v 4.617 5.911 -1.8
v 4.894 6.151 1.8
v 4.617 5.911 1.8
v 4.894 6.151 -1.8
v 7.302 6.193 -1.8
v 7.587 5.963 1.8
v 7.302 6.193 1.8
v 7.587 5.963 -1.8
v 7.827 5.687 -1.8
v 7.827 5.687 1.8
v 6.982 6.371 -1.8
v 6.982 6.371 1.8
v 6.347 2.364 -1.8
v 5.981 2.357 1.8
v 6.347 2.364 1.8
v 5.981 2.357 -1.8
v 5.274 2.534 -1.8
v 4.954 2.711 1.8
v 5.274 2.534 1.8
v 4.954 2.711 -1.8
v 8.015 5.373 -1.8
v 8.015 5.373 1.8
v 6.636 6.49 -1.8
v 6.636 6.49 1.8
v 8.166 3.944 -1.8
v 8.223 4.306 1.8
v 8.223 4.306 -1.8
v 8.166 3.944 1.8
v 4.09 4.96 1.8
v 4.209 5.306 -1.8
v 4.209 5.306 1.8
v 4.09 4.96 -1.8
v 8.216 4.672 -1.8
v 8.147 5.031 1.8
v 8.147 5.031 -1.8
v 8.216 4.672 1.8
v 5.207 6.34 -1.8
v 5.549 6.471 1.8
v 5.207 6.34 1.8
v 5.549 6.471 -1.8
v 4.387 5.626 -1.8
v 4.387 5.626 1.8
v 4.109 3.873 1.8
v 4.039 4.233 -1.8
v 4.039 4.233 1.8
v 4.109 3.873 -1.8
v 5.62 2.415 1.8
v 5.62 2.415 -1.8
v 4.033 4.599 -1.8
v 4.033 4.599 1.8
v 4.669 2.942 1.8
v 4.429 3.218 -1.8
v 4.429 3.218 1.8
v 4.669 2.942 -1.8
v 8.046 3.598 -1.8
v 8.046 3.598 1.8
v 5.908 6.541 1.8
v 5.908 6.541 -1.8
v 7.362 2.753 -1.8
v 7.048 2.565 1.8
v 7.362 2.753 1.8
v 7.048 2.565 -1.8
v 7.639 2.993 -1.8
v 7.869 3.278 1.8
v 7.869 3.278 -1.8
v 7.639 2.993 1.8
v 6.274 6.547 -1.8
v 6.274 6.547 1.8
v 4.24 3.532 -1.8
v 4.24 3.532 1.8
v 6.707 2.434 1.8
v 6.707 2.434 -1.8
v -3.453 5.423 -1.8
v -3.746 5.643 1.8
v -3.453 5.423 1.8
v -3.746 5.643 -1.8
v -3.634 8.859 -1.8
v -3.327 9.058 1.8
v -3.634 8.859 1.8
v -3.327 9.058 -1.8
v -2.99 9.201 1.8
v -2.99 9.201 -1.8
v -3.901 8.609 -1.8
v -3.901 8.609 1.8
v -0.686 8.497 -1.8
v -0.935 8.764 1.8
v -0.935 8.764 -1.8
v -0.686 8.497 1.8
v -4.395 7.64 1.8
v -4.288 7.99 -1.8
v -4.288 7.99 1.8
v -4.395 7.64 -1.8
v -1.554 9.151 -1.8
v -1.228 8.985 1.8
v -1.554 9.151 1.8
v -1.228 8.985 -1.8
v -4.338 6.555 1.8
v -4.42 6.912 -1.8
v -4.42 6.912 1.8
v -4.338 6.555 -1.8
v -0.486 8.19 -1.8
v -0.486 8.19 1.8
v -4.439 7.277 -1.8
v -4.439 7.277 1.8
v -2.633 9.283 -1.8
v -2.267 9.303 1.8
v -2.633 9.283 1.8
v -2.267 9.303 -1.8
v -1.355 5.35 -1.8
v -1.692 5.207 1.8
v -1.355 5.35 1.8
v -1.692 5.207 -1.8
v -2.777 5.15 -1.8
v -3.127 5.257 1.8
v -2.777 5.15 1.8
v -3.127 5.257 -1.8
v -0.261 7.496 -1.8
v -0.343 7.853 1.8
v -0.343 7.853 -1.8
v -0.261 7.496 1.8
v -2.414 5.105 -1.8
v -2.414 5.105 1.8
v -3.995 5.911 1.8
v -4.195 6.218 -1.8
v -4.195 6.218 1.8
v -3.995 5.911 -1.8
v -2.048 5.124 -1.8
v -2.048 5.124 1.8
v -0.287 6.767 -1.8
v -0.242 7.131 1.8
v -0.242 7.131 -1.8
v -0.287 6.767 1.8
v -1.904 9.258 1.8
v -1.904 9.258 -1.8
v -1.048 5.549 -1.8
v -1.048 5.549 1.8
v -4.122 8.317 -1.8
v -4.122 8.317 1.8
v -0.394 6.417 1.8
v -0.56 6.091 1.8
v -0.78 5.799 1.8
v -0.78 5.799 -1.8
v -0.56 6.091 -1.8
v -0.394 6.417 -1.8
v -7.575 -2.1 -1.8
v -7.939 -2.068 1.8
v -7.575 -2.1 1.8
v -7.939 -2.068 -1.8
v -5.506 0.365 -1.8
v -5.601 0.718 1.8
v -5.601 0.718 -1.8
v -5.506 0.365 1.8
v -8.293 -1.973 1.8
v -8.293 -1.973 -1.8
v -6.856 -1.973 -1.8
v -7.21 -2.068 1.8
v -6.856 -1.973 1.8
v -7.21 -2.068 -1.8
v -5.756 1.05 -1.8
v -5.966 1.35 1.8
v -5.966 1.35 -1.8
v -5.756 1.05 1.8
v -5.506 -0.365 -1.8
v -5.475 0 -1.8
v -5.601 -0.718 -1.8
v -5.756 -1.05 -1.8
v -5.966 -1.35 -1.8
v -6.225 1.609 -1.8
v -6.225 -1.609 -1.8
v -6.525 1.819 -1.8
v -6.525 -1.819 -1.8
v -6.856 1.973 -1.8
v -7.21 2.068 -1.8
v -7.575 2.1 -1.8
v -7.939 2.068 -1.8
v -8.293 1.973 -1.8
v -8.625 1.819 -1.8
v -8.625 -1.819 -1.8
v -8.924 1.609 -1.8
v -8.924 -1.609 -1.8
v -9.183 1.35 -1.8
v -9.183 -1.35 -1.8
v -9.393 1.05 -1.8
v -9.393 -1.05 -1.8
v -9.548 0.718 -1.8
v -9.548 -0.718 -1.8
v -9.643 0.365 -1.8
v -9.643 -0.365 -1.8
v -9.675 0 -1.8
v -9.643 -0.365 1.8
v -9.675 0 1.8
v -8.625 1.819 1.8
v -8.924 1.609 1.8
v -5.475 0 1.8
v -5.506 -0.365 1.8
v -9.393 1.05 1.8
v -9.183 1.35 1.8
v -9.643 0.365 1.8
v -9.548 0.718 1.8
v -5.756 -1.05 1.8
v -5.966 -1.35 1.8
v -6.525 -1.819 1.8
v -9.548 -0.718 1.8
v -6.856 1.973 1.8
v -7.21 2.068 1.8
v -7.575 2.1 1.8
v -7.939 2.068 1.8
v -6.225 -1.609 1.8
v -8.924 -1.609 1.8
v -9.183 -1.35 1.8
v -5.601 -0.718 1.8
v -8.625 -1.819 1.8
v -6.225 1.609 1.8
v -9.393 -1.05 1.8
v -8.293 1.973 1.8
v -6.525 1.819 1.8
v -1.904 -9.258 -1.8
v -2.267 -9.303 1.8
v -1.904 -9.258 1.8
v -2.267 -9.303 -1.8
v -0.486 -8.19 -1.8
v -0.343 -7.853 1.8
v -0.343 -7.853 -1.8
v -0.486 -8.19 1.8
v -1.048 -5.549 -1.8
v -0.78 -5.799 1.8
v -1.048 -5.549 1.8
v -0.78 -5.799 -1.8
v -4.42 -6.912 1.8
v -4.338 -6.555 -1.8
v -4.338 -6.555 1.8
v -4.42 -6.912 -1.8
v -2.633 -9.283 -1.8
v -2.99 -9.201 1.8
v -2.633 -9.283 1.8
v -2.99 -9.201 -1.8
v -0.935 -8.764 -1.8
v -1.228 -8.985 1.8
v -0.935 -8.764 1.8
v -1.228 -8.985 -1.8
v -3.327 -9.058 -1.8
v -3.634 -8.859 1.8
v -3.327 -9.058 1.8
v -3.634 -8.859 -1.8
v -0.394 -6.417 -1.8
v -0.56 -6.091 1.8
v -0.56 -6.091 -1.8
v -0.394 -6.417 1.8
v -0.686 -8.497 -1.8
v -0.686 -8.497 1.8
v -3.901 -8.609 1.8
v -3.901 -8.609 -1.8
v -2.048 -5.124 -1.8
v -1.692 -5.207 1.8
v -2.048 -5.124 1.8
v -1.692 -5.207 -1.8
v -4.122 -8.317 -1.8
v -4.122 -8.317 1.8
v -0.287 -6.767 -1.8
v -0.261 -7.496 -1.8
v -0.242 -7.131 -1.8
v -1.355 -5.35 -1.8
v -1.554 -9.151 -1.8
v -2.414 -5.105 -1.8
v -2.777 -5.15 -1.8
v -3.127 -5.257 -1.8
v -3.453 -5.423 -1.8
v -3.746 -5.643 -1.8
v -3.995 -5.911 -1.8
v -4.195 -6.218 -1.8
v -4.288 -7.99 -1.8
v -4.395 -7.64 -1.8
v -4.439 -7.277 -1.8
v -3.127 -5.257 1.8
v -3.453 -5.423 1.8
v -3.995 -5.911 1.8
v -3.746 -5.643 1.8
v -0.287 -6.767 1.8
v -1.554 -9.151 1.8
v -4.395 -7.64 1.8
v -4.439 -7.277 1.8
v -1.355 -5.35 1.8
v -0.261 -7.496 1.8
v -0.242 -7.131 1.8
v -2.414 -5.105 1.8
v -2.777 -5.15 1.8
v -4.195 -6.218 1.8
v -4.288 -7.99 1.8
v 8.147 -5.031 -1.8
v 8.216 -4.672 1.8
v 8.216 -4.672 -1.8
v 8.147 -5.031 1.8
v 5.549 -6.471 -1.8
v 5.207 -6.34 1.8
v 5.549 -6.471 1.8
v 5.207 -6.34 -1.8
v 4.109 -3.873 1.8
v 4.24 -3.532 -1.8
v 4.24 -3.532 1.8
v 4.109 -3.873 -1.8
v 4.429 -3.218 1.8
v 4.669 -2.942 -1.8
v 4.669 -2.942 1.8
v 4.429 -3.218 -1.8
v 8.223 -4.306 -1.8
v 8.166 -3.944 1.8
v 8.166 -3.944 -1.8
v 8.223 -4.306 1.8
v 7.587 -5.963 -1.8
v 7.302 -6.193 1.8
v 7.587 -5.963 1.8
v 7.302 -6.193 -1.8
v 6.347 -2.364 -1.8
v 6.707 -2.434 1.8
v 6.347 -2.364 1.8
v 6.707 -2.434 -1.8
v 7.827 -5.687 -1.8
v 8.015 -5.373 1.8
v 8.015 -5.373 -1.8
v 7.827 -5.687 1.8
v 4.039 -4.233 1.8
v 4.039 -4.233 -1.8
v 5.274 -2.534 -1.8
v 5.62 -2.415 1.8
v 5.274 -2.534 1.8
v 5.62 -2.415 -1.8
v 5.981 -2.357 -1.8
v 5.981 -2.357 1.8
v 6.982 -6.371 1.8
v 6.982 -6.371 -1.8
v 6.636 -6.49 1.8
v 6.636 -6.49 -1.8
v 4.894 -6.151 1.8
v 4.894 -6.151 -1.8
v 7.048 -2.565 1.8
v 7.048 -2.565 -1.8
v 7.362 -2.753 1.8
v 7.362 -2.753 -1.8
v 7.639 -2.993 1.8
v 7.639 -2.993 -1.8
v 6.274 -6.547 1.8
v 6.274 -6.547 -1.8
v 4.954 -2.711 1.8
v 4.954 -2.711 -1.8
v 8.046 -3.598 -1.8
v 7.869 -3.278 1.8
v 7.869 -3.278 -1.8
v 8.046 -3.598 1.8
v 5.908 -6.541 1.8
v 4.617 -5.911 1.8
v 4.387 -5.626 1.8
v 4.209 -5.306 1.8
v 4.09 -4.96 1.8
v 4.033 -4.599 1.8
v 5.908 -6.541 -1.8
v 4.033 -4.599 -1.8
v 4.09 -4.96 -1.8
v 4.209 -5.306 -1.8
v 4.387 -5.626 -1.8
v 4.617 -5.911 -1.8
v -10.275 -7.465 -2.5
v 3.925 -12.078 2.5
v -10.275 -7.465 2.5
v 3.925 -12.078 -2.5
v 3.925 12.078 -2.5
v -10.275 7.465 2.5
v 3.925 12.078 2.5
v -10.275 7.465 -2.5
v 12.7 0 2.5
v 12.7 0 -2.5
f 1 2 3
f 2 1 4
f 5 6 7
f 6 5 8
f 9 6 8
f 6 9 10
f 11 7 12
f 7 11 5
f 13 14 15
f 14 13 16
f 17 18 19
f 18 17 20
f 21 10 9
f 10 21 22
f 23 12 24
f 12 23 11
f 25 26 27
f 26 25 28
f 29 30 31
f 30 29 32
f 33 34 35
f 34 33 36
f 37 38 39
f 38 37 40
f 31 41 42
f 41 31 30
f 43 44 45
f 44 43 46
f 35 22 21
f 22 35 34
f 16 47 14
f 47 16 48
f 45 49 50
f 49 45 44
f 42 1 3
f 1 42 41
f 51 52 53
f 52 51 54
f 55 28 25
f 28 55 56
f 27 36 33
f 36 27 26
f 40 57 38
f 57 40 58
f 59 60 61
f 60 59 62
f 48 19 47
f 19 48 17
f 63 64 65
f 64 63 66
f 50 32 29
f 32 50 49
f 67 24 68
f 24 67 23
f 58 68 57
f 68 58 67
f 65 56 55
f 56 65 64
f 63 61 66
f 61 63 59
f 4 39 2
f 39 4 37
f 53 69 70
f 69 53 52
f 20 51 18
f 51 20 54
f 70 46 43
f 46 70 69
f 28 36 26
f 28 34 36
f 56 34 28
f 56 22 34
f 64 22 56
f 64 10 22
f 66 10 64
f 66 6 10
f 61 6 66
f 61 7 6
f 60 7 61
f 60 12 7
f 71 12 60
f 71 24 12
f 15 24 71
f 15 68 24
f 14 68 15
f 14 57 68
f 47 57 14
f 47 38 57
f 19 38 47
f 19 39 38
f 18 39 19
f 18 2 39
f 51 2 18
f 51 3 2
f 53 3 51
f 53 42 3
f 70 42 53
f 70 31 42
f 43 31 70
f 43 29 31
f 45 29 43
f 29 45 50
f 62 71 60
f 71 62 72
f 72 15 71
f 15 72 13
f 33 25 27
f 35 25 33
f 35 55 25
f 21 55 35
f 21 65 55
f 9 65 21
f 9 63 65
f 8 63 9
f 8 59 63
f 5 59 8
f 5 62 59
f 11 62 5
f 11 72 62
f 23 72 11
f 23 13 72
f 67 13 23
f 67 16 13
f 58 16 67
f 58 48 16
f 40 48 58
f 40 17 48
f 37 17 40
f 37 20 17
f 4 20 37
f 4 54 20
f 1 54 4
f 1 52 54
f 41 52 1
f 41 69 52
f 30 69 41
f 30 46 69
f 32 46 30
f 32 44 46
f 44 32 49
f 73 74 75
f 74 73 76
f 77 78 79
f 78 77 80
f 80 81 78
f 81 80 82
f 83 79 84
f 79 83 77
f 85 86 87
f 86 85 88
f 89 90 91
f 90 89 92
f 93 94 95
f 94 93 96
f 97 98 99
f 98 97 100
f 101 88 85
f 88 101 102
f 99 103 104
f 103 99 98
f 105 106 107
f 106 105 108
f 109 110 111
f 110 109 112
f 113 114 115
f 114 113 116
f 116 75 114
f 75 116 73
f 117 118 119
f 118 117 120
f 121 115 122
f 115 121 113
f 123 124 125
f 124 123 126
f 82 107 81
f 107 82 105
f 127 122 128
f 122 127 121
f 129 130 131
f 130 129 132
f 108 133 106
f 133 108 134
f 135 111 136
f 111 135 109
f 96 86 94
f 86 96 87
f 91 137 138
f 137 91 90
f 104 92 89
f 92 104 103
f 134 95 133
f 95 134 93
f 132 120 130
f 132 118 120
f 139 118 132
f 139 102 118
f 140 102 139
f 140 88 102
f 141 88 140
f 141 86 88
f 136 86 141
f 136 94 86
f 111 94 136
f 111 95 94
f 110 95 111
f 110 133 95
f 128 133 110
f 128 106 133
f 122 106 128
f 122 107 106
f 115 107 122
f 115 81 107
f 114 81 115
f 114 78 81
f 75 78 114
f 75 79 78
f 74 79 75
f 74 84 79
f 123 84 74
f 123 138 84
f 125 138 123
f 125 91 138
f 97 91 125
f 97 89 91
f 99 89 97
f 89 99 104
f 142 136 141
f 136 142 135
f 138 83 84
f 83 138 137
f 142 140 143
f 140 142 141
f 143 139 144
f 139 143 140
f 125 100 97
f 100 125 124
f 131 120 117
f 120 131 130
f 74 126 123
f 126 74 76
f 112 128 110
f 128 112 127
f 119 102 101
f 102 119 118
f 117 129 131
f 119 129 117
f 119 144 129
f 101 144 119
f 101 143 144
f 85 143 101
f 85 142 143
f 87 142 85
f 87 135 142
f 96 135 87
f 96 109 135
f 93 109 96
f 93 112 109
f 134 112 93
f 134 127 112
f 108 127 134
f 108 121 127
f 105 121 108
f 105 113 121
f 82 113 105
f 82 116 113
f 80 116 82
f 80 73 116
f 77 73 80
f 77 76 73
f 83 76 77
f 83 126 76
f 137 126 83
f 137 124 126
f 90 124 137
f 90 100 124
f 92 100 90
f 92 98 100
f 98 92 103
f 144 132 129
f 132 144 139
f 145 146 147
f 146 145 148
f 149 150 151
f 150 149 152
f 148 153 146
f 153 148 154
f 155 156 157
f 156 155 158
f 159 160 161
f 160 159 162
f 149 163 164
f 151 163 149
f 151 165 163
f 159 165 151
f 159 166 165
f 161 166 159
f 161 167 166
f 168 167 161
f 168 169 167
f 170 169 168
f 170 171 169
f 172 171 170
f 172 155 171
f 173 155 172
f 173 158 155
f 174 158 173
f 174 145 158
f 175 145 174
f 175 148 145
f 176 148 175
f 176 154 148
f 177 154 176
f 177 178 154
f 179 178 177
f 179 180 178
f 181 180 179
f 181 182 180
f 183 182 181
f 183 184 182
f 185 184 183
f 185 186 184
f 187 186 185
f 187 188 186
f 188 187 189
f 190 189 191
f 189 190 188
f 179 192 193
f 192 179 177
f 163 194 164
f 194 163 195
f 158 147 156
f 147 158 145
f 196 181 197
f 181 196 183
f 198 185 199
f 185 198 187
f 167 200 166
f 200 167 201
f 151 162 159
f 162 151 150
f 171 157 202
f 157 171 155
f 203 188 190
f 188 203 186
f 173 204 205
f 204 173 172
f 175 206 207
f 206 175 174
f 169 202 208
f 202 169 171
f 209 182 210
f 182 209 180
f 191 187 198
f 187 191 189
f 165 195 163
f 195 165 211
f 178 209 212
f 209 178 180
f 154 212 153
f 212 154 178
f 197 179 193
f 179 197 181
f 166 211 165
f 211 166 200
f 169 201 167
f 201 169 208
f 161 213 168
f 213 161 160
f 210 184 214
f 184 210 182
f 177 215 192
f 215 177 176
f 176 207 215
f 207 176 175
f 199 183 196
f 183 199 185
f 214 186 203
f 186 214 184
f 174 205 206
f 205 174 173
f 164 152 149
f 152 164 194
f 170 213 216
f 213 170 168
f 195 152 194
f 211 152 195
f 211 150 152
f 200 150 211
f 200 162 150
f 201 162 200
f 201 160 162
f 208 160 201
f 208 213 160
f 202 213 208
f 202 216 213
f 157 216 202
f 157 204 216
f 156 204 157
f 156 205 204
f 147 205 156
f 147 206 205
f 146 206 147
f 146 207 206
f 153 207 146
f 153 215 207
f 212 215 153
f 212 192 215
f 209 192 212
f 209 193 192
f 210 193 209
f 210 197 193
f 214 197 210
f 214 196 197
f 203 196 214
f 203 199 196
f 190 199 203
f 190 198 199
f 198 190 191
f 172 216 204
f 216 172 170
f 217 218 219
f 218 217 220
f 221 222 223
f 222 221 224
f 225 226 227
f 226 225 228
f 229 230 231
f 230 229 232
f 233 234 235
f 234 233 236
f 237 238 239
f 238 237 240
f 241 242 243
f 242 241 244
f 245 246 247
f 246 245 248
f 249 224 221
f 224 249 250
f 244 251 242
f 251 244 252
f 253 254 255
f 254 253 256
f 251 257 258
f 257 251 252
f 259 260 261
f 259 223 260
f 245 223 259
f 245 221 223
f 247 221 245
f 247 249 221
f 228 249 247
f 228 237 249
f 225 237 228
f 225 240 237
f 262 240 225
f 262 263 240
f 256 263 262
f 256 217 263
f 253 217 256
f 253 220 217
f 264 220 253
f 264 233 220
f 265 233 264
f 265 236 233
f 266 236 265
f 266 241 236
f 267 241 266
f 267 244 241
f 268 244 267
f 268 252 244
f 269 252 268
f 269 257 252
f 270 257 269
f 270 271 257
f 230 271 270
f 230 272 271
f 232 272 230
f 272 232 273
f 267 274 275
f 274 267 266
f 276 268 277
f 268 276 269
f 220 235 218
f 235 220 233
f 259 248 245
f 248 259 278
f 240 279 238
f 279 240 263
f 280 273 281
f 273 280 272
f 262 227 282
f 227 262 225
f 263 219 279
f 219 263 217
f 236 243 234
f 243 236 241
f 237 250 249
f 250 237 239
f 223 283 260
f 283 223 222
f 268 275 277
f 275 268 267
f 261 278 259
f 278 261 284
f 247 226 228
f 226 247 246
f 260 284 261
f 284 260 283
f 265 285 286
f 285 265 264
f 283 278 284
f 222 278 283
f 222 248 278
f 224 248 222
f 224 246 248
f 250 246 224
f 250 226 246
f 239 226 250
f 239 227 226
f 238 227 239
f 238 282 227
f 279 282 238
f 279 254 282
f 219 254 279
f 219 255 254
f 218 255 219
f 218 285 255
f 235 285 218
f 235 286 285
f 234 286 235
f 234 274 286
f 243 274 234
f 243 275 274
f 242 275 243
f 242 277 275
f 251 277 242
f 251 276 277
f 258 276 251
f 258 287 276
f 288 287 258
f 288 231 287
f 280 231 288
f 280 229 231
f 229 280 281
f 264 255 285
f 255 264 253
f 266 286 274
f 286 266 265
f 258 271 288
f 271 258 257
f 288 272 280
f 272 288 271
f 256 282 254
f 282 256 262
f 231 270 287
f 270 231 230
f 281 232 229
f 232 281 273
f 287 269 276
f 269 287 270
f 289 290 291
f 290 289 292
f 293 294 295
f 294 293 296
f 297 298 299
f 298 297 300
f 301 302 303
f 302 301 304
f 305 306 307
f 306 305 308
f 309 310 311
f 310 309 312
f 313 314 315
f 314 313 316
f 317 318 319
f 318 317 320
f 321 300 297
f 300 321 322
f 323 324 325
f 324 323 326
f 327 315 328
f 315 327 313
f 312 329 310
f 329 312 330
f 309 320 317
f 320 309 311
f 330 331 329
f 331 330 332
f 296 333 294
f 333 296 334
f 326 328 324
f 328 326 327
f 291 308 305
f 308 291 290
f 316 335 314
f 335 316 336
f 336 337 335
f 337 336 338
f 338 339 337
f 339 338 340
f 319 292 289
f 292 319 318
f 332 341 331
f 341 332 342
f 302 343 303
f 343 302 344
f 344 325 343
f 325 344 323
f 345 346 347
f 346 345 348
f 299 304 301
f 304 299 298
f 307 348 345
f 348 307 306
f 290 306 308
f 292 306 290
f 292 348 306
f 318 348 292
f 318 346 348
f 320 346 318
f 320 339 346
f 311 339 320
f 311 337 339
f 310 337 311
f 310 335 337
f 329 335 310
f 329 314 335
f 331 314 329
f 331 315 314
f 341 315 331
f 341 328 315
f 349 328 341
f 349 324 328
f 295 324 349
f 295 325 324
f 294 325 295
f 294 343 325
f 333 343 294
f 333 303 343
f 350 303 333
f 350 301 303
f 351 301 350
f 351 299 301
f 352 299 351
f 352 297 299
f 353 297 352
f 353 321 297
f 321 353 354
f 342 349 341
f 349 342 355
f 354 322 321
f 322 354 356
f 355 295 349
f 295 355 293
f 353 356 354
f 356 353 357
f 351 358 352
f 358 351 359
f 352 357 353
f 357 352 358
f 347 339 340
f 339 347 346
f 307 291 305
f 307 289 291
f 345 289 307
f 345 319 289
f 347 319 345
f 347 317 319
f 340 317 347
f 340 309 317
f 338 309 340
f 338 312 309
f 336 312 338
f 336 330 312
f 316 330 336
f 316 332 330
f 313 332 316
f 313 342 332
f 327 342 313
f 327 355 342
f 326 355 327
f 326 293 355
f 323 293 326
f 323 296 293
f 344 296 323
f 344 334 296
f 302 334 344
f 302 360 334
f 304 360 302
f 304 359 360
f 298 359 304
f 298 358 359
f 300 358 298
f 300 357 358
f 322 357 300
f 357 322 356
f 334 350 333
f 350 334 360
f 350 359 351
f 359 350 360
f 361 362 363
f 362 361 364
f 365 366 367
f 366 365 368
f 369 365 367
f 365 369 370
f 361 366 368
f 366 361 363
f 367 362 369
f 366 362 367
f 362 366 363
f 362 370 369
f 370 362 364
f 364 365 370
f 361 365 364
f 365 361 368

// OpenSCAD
// pentagon.scad

inch = 25.4;
h = 5; // height unit, 5mm
o2 = 0.2;
br = 1.7; // ball radius
n = 5; // 5 sides

r = 0.5 * inch; // radius
ro = r * cos(180 / n); // shortest distance from center to side
echo("radius:", r);
echo("diameter:", 2 * r);
echo("side:", 2 * r * sin(360 / (n * 2)));
echo("ro:", ro);

module balcyl(deeper=false) {

  hf = 2;
  h = br * hf + o2;

  cylinder(r=br + 2 * o2, h=h, center=true, $fn=36);
}

difference() {
  //%cylinder(h=h, r=r, center=true, $fn=n);
  cylinder(h=h, r=r, center=true, $fn=n);
  union() {
    //balcyl();
    for(a = [ 360 / (n * 2) : 360 / n : 360 ]) {
      //echo(a);
      rotate([ 0, 0, a ]) translate([ ro - br - 5 * o2, 0, 0 ]) balcyl();
    }
  }
}
